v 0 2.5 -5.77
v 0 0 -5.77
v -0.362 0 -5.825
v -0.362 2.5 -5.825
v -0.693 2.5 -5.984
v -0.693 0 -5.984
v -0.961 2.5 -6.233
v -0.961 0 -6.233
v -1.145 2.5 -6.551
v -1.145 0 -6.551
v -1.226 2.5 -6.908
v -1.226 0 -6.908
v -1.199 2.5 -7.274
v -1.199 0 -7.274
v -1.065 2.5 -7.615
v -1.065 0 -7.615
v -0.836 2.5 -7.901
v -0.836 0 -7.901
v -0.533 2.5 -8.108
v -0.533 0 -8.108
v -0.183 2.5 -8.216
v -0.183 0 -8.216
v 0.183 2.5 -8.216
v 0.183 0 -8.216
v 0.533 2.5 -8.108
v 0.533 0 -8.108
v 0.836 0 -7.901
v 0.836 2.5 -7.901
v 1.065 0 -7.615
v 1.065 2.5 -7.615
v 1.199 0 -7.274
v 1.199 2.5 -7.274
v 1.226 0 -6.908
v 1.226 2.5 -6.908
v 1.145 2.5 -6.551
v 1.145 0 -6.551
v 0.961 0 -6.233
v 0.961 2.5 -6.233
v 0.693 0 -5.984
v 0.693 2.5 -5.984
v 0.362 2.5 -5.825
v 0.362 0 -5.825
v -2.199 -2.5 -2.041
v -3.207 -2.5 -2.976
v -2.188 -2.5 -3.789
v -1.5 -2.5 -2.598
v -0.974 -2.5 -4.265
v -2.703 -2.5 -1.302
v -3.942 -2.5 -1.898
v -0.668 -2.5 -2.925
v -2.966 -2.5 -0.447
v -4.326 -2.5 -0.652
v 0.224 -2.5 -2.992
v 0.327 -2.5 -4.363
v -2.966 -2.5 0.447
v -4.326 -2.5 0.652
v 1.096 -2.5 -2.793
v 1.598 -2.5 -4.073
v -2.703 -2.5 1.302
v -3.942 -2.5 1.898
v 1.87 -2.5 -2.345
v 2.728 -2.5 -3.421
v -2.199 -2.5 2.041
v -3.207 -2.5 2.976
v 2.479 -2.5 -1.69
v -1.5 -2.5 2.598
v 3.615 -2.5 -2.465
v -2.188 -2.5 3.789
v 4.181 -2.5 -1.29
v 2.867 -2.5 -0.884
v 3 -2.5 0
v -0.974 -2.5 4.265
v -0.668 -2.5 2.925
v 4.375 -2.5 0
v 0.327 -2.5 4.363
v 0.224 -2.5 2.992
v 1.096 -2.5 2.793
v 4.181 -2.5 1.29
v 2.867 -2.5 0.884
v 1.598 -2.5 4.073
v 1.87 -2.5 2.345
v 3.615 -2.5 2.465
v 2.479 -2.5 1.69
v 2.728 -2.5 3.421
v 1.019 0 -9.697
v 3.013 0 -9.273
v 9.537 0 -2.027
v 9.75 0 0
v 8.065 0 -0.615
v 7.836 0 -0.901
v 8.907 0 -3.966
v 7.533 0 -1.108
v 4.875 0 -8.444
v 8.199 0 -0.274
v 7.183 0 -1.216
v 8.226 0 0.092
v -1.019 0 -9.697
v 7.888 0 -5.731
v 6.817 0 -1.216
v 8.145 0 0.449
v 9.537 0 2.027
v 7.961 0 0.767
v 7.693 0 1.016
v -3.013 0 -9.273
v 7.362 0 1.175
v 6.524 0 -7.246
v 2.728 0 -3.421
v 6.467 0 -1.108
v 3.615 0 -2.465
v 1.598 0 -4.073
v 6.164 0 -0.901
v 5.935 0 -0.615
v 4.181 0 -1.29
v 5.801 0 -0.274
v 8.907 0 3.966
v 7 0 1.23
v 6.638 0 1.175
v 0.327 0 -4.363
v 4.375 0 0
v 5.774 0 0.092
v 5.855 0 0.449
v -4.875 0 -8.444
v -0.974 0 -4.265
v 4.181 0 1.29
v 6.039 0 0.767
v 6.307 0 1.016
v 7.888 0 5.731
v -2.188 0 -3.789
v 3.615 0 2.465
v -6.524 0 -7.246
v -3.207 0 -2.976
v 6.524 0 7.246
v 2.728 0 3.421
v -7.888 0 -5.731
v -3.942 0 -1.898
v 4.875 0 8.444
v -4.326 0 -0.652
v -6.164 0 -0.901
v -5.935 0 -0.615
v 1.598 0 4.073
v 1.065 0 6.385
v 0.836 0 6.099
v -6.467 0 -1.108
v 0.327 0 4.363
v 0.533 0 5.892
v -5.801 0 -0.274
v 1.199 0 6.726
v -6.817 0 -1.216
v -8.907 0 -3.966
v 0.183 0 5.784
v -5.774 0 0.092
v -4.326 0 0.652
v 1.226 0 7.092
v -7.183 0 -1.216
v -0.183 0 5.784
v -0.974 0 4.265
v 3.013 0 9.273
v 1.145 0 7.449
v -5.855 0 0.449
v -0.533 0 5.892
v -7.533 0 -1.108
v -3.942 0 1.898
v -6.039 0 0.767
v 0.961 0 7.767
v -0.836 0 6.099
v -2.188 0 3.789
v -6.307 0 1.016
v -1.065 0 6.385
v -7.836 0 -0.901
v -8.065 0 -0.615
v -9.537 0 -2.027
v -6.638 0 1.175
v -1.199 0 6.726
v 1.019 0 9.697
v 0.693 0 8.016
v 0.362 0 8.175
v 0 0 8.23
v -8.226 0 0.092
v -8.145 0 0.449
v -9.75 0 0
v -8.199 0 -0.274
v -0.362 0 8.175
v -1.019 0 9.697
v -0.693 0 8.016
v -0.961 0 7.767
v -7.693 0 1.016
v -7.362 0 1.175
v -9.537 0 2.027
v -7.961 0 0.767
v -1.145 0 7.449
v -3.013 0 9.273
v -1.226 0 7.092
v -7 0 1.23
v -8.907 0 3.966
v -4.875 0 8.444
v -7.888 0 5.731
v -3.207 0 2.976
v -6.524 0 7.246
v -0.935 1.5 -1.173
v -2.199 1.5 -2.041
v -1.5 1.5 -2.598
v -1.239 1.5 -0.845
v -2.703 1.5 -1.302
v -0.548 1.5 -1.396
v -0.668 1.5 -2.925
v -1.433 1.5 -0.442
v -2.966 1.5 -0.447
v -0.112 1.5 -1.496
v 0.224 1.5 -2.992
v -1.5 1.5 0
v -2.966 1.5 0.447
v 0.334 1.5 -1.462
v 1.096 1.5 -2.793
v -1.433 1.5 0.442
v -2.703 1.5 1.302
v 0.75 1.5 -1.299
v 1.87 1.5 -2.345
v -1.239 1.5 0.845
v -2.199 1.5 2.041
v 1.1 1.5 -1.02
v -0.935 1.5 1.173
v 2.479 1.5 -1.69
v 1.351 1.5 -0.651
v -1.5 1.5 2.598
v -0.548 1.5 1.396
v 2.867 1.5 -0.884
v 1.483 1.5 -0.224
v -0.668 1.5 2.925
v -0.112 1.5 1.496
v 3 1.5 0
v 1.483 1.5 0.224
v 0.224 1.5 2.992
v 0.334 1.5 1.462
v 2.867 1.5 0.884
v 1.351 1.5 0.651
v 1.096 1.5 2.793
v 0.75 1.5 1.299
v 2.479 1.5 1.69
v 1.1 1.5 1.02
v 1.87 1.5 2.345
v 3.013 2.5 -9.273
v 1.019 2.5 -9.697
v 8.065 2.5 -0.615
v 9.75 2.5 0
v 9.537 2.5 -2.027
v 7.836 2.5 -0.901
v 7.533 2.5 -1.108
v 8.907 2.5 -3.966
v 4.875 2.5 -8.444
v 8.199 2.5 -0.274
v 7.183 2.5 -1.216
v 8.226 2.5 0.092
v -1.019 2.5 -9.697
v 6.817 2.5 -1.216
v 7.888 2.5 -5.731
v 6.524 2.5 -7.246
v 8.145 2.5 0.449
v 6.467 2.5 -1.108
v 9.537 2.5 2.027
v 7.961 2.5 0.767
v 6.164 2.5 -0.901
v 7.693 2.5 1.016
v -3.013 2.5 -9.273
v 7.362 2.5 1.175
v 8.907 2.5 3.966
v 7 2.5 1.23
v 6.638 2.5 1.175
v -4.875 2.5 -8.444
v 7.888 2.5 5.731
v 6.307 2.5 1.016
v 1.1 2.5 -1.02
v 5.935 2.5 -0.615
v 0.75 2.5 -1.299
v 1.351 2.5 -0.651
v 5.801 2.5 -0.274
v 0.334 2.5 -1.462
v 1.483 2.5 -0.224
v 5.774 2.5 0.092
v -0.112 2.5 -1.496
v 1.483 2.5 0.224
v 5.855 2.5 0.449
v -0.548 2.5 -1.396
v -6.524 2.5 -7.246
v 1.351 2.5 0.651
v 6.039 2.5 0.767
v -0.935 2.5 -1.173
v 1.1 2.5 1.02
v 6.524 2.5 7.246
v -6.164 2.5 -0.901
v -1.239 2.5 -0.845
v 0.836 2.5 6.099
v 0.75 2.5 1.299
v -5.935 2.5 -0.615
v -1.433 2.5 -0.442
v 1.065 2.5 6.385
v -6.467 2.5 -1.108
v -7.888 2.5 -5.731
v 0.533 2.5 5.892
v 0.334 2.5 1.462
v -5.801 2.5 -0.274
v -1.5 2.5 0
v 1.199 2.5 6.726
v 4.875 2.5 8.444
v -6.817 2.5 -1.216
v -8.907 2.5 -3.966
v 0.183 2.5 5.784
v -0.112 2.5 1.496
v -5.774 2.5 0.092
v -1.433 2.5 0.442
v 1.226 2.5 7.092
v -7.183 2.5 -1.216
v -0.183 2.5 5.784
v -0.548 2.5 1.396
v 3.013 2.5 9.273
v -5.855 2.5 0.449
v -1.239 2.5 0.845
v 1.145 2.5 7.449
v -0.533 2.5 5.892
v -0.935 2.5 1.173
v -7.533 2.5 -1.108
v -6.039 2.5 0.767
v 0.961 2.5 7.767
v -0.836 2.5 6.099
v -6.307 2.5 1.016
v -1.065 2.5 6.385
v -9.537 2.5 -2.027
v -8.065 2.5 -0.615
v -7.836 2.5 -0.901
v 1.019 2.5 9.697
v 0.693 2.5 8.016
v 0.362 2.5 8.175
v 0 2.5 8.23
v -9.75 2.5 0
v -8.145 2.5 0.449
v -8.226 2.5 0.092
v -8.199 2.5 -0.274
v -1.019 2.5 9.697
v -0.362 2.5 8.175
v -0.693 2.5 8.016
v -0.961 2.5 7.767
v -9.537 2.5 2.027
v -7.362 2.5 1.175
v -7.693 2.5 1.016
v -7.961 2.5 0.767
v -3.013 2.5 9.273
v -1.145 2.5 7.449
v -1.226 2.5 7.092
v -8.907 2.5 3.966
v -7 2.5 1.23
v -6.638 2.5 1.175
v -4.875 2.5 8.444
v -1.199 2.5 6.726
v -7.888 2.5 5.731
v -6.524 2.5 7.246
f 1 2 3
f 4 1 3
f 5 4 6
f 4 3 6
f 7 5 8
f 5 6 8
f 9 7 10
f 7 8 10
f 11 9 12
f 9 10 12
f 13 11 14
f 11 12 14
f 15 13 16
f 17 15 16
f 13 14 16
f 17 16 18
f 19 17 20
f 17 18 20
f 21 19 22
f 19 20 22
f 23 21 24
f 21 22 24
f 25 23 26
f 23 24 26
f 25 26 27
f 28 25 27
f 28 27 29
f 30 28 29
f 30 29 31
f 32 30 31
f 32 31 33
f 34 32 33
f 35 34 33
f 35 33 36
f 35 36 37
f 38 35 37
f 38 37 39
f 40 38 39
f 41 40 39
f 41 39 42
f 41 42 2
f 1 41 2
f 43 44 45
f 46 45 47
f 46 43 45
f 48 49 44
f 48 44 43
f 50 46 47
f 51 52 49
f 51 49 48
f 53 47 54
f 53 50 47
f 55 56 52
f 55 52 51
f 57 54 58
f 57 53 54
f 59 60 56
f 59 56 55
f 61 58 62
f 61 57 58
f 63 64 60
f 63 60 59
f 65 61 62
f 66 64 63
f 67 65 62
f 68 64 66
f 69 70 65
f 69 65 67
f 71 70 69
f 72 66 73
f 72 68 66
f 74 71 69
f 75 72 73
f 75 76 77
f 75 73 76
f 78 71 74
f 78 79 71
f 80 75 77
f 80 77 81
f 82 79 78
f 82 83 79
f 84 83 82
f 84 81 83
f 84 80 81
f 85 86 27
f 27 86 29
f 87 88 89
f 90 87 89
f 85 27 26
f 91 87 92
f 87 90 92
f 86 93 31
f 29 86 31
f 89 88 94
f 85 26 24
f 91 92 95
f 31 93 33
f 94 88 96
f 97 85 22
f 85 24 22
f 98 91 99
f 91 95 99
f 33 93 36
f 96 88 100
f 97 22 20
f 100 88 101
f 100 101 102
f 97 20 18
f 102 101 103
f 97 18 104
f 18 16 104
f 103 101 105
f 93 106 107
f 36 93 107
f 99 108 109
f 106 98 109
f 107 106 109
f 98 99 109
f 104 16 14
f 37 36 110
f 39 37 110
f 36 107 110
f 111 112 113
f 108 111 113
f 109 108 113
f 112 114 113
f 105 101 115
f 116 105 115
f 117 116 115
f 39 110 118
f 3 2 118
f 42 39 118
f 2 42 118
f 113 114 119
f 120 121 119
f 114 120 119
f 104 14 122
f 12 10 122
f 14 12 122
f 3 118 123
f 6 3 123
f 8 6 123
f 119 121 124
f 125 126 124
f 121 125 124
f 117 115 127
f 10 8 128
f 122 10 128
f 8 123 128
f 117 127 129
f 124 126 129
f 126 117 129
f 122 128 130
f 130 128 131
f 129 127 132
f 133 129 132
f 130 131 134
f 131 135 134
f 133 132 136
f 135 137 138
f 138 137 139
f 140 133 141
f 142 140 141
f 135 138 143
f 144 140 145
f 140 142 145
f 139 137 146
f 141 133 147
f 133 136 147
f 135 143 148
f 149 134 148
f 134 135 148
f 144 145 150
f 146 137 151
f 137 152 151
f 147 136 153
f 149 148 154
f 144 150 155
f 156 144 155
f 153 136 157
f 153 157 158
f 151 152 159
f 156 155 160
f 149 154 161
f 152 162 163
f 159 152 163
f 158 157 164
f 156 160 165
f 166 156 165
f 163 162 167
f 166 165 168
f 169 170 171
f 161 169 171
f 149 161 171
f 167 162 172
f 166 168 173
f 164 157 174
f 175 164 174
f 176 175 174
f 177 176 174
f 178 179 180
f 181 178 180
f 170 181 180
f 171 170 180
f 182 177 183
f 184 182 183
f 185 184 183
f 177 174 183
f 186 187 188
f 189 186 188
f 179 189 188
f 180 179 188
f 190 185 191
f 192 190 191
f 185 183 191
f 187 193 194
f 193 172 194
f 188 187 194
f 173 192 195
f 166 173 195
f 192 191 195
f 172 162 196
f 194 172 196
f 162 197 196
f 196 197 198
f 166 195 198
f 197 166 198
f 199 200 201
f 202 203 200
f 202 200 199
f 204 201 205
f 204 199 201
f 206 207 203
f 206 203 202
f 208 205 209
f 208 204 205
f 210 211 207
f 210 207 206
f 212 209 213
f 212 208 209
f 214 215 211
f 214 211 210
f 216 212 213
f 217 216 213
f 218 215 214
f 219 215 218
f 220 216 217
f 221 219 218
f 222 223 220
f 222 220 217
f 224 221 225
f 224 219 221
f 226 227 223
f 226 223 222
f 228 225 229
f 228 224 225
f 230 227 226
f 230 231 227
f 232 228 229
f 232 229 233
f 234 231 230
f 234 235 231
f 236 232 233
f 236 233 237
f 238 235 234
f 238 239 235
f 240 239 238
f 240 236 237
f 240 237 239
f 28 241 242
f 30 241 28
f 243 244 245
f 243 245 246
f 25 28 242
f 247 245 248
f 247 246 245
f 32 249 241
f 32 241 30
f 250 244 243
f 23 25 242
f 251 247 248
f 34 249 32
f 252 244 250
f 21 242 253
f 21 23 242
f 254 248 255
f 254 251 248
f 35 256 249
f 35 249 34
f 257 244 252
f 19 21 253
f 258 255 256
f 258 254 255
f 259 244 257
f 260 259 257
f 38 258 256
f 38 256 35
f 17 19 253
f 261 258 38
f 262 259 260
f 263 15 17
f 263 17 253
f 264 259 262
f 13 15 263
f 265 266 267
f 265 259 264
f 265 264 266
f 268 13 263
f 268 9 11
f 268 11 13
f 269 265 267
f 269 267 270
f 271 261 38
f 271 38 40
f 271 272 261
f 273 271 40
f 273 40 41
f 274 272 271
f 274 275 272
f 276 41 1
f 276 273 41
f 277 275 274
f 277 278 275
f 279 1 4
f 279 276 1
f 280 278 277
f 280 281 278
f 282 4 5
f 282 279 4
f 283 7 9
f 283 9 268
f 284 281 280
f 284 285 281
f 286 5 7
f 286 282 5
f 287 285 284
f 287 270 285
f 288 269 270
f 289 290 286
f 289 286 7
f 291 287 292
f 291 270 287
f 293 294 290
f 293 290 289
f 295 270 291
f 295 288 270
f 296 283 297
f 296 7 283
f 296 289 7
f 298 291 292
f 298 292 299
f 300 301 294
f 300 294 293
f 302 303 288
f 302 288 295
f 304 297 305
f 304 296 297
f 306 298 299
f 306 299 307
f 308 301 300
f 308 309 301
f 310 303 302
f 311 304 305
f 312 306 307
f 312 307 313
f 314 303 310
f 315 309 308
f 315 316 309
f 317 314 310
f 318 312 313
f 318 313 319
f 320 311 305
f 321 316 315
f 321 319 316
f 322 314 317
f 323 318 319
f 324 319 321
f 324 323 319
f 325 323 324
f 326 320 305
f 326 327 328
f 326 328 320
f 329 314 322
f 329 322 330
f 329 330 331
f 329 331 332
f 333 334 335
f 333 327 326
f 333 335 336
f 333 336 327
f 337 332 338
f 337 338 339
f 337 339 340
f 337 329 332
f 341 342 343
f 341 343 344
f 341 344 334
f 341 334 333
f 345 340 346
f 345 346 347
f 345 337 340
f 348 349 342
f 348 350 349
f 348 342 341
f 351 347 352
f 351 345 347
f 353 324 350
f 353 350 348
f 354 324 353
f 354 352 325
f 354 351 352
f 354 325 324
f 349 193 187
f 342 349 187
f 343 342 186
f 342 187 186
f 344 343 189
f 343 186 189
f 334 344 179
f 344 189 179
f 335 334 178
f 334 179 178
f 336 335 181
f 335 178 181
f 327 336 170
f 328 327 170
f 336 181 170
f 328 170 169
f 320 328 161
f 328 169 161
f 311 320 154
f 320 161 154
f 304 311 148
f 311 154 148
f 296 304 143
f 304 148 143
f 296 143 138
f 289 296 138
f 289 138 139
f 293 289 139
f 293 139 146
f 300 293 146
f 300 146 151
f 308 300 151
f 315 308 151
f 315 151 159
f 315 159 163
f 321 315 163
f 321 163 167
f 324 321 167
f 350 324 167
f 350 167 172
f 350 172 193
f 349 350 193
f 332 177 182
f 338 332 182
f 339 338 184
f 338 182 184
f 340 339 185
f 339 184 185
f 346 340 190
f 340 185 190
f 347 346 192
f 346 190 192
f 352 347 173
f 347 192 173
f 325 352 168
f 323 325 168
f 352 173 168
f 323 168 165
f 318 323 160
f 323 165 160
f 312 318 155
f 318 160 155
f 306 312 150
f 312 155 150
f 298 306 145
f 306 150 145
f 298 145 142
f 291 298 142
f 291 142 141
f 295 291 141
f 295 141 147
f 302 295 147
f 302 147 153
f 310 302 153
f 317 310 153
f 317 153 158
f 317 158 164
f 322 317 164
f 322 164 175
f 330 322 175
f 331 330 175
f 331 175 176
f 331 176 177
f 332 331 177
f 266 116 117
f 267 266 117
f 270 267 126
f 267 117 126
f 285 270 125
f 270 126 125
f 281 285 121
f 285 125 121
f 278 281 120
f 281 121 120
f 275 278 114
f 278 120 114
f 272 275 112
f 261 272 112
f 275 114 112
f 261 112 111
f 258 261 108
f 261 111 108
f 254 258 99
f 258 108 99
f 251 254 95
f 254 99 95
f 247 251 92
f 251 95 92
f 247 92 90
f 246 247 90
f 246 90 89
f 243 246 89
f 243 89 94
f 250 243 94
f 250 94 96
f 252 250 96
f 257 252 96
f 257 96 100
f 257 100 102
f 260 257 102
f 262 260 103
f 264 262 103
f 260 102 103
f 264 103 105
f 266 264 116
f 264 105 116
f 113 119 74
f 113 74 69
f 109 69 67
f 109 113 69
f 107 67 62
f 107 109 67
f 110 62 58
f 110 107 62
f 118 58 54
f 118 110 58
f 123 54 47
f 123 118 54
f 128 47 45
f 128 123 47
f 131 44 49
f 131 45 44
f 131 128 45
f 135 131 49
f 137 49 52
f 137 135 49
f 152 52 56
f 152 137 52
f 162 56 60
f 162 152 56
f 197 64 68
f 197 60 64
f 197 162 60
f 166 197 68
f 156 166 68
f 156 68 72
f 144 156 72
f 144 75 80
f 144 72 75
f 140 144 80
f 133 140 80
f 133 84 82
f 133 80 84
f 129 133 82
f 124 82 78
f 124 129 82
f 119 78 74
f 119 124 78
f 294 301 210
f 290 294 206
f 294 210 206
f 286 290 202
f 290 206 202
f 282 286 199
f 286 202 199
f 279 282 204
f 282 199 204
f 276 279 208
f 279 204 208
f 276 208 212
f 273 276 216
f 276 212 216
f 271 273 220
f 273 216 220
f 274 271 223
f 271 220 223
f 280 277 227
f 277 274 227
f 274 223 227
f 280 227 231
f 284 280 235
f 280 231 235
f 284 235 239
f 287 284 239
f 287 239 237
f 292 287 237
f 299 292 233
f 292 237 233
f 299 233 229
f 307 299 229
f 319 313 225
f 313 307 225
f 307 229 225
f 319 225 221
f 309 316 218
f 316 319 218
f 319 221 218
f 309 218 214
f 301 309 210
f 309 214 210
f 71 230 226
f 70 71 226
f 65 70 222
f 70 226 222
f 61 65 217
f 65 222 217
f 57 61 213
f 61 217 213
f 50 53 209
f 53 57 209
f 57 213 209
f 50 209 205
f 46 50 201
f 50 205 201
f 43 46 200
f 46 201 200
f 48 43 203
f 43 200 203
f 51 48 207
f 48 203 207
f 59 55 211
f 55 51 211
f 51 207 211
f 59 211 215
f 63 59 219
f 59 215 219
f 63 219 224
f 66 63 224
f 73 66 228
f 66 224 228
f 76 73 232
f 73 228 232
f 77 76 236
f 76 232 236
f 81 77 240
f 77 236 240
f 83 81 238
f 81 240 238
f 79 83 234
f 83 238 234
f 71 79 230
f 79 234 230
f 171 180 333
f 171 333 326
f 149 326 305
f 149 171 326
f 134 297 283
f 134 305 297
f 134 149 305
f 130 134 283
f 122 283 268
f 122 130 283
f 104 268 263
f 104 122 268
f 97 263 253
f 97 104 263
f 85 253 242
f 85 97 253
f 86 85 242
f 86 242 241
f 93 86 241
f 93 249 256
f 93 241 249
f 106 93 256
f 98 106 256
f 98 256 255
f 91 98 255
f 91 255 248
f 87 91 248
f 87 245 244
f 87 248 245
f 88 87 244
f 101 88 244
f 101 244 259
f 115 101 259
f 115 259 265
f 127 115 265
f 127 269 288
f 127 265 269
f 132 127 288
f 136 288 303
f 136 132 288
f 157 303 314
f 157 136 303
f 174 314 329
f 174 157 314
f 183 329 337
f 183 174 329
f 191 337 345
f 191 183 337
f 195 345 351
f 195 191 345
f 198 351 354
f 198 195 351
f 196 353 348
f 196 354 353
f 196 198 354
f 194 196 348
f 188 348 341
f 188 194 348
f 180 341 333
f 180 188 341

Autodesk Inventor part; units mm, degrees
ref_plane "YZ Plane" through (0, 0, 0) normal (1, 0, 0) x (0, 1, 0)
ref_plane "XZ Plane" through (0, 0, 0) normal (0, 1, 0) x (-1, 0, 0)
ref_plane "XY Plane" through (0, 0, 0) normal (0, 0, 1) x (1, 0, 0)
sketch "Sketch1" plane through (0, 0, 0) normal (0, 1, 0) x (-1, 0, 0)
  circle A0 centre (0, 0) radius 9.75
  circle A1 centre (0, 0) radius 1.5
  circle A2 centre (0, 0) radius 7 construction
  line L0 (0, 0) -> (7, 0) construction
  point P0 (0, 7)
  point P1 (-7, 0)
  point P2 (0, -7)
  dimension "d3" = 14
  dimension "d0" = 19.5
  dimension "d1" = 3
  dimension "d16" = 360
extrude "Extrusion1" add sketch "Sketch1" along normal blind 2.5
sketch "Sketch2" plane through (0, 0, 0) normal (0, -1, 0) x (1, 0, 0)
  circle A0 centre (0, 0) radius 4.375
  circle A1 centre (0, 0) radius 3
  dimension "d10" = 8.75
  dimension "d11" = 6
extrude "Extrusion2" add sketch "Sketch2" along normal blind 2.5
sketch "Sketch3" plane through (0, 0, 0) normal (0, -1, 0) x (1, 0, 0)
  circle A0 centre (0, 0) radius 3 projected
  circle A1 centre (0, 0) radius 1.5 projected
extrude "Extrusion3" cut sketch "Sketch3" against normal blind 1.5
sketch "Sketch4" plane through (0, 2.5, 0) normal (0, 1, 0) x (1, 0, 0)
  circle A0 centre (0, 0) radius 7 construction
  line L0 (0, 7) -> (0, 0) construction
  point P0 (-7, 0)
  point P1 (0, -7)
  point P2 (7, 0)
  dimension "d20" = 14
  dimension "d23" = 360
hole "Hole1" at (-7, 2.5, 0) at (0, 2.5, 7) at (7, 2.5, 0) at (0, 2.5, -7) direction (0, -1, 0) diameter 2.459 end up to surface thread size "M3x0.5" class "6H" standard "ISO Metric profile"
properties part number "CH"
